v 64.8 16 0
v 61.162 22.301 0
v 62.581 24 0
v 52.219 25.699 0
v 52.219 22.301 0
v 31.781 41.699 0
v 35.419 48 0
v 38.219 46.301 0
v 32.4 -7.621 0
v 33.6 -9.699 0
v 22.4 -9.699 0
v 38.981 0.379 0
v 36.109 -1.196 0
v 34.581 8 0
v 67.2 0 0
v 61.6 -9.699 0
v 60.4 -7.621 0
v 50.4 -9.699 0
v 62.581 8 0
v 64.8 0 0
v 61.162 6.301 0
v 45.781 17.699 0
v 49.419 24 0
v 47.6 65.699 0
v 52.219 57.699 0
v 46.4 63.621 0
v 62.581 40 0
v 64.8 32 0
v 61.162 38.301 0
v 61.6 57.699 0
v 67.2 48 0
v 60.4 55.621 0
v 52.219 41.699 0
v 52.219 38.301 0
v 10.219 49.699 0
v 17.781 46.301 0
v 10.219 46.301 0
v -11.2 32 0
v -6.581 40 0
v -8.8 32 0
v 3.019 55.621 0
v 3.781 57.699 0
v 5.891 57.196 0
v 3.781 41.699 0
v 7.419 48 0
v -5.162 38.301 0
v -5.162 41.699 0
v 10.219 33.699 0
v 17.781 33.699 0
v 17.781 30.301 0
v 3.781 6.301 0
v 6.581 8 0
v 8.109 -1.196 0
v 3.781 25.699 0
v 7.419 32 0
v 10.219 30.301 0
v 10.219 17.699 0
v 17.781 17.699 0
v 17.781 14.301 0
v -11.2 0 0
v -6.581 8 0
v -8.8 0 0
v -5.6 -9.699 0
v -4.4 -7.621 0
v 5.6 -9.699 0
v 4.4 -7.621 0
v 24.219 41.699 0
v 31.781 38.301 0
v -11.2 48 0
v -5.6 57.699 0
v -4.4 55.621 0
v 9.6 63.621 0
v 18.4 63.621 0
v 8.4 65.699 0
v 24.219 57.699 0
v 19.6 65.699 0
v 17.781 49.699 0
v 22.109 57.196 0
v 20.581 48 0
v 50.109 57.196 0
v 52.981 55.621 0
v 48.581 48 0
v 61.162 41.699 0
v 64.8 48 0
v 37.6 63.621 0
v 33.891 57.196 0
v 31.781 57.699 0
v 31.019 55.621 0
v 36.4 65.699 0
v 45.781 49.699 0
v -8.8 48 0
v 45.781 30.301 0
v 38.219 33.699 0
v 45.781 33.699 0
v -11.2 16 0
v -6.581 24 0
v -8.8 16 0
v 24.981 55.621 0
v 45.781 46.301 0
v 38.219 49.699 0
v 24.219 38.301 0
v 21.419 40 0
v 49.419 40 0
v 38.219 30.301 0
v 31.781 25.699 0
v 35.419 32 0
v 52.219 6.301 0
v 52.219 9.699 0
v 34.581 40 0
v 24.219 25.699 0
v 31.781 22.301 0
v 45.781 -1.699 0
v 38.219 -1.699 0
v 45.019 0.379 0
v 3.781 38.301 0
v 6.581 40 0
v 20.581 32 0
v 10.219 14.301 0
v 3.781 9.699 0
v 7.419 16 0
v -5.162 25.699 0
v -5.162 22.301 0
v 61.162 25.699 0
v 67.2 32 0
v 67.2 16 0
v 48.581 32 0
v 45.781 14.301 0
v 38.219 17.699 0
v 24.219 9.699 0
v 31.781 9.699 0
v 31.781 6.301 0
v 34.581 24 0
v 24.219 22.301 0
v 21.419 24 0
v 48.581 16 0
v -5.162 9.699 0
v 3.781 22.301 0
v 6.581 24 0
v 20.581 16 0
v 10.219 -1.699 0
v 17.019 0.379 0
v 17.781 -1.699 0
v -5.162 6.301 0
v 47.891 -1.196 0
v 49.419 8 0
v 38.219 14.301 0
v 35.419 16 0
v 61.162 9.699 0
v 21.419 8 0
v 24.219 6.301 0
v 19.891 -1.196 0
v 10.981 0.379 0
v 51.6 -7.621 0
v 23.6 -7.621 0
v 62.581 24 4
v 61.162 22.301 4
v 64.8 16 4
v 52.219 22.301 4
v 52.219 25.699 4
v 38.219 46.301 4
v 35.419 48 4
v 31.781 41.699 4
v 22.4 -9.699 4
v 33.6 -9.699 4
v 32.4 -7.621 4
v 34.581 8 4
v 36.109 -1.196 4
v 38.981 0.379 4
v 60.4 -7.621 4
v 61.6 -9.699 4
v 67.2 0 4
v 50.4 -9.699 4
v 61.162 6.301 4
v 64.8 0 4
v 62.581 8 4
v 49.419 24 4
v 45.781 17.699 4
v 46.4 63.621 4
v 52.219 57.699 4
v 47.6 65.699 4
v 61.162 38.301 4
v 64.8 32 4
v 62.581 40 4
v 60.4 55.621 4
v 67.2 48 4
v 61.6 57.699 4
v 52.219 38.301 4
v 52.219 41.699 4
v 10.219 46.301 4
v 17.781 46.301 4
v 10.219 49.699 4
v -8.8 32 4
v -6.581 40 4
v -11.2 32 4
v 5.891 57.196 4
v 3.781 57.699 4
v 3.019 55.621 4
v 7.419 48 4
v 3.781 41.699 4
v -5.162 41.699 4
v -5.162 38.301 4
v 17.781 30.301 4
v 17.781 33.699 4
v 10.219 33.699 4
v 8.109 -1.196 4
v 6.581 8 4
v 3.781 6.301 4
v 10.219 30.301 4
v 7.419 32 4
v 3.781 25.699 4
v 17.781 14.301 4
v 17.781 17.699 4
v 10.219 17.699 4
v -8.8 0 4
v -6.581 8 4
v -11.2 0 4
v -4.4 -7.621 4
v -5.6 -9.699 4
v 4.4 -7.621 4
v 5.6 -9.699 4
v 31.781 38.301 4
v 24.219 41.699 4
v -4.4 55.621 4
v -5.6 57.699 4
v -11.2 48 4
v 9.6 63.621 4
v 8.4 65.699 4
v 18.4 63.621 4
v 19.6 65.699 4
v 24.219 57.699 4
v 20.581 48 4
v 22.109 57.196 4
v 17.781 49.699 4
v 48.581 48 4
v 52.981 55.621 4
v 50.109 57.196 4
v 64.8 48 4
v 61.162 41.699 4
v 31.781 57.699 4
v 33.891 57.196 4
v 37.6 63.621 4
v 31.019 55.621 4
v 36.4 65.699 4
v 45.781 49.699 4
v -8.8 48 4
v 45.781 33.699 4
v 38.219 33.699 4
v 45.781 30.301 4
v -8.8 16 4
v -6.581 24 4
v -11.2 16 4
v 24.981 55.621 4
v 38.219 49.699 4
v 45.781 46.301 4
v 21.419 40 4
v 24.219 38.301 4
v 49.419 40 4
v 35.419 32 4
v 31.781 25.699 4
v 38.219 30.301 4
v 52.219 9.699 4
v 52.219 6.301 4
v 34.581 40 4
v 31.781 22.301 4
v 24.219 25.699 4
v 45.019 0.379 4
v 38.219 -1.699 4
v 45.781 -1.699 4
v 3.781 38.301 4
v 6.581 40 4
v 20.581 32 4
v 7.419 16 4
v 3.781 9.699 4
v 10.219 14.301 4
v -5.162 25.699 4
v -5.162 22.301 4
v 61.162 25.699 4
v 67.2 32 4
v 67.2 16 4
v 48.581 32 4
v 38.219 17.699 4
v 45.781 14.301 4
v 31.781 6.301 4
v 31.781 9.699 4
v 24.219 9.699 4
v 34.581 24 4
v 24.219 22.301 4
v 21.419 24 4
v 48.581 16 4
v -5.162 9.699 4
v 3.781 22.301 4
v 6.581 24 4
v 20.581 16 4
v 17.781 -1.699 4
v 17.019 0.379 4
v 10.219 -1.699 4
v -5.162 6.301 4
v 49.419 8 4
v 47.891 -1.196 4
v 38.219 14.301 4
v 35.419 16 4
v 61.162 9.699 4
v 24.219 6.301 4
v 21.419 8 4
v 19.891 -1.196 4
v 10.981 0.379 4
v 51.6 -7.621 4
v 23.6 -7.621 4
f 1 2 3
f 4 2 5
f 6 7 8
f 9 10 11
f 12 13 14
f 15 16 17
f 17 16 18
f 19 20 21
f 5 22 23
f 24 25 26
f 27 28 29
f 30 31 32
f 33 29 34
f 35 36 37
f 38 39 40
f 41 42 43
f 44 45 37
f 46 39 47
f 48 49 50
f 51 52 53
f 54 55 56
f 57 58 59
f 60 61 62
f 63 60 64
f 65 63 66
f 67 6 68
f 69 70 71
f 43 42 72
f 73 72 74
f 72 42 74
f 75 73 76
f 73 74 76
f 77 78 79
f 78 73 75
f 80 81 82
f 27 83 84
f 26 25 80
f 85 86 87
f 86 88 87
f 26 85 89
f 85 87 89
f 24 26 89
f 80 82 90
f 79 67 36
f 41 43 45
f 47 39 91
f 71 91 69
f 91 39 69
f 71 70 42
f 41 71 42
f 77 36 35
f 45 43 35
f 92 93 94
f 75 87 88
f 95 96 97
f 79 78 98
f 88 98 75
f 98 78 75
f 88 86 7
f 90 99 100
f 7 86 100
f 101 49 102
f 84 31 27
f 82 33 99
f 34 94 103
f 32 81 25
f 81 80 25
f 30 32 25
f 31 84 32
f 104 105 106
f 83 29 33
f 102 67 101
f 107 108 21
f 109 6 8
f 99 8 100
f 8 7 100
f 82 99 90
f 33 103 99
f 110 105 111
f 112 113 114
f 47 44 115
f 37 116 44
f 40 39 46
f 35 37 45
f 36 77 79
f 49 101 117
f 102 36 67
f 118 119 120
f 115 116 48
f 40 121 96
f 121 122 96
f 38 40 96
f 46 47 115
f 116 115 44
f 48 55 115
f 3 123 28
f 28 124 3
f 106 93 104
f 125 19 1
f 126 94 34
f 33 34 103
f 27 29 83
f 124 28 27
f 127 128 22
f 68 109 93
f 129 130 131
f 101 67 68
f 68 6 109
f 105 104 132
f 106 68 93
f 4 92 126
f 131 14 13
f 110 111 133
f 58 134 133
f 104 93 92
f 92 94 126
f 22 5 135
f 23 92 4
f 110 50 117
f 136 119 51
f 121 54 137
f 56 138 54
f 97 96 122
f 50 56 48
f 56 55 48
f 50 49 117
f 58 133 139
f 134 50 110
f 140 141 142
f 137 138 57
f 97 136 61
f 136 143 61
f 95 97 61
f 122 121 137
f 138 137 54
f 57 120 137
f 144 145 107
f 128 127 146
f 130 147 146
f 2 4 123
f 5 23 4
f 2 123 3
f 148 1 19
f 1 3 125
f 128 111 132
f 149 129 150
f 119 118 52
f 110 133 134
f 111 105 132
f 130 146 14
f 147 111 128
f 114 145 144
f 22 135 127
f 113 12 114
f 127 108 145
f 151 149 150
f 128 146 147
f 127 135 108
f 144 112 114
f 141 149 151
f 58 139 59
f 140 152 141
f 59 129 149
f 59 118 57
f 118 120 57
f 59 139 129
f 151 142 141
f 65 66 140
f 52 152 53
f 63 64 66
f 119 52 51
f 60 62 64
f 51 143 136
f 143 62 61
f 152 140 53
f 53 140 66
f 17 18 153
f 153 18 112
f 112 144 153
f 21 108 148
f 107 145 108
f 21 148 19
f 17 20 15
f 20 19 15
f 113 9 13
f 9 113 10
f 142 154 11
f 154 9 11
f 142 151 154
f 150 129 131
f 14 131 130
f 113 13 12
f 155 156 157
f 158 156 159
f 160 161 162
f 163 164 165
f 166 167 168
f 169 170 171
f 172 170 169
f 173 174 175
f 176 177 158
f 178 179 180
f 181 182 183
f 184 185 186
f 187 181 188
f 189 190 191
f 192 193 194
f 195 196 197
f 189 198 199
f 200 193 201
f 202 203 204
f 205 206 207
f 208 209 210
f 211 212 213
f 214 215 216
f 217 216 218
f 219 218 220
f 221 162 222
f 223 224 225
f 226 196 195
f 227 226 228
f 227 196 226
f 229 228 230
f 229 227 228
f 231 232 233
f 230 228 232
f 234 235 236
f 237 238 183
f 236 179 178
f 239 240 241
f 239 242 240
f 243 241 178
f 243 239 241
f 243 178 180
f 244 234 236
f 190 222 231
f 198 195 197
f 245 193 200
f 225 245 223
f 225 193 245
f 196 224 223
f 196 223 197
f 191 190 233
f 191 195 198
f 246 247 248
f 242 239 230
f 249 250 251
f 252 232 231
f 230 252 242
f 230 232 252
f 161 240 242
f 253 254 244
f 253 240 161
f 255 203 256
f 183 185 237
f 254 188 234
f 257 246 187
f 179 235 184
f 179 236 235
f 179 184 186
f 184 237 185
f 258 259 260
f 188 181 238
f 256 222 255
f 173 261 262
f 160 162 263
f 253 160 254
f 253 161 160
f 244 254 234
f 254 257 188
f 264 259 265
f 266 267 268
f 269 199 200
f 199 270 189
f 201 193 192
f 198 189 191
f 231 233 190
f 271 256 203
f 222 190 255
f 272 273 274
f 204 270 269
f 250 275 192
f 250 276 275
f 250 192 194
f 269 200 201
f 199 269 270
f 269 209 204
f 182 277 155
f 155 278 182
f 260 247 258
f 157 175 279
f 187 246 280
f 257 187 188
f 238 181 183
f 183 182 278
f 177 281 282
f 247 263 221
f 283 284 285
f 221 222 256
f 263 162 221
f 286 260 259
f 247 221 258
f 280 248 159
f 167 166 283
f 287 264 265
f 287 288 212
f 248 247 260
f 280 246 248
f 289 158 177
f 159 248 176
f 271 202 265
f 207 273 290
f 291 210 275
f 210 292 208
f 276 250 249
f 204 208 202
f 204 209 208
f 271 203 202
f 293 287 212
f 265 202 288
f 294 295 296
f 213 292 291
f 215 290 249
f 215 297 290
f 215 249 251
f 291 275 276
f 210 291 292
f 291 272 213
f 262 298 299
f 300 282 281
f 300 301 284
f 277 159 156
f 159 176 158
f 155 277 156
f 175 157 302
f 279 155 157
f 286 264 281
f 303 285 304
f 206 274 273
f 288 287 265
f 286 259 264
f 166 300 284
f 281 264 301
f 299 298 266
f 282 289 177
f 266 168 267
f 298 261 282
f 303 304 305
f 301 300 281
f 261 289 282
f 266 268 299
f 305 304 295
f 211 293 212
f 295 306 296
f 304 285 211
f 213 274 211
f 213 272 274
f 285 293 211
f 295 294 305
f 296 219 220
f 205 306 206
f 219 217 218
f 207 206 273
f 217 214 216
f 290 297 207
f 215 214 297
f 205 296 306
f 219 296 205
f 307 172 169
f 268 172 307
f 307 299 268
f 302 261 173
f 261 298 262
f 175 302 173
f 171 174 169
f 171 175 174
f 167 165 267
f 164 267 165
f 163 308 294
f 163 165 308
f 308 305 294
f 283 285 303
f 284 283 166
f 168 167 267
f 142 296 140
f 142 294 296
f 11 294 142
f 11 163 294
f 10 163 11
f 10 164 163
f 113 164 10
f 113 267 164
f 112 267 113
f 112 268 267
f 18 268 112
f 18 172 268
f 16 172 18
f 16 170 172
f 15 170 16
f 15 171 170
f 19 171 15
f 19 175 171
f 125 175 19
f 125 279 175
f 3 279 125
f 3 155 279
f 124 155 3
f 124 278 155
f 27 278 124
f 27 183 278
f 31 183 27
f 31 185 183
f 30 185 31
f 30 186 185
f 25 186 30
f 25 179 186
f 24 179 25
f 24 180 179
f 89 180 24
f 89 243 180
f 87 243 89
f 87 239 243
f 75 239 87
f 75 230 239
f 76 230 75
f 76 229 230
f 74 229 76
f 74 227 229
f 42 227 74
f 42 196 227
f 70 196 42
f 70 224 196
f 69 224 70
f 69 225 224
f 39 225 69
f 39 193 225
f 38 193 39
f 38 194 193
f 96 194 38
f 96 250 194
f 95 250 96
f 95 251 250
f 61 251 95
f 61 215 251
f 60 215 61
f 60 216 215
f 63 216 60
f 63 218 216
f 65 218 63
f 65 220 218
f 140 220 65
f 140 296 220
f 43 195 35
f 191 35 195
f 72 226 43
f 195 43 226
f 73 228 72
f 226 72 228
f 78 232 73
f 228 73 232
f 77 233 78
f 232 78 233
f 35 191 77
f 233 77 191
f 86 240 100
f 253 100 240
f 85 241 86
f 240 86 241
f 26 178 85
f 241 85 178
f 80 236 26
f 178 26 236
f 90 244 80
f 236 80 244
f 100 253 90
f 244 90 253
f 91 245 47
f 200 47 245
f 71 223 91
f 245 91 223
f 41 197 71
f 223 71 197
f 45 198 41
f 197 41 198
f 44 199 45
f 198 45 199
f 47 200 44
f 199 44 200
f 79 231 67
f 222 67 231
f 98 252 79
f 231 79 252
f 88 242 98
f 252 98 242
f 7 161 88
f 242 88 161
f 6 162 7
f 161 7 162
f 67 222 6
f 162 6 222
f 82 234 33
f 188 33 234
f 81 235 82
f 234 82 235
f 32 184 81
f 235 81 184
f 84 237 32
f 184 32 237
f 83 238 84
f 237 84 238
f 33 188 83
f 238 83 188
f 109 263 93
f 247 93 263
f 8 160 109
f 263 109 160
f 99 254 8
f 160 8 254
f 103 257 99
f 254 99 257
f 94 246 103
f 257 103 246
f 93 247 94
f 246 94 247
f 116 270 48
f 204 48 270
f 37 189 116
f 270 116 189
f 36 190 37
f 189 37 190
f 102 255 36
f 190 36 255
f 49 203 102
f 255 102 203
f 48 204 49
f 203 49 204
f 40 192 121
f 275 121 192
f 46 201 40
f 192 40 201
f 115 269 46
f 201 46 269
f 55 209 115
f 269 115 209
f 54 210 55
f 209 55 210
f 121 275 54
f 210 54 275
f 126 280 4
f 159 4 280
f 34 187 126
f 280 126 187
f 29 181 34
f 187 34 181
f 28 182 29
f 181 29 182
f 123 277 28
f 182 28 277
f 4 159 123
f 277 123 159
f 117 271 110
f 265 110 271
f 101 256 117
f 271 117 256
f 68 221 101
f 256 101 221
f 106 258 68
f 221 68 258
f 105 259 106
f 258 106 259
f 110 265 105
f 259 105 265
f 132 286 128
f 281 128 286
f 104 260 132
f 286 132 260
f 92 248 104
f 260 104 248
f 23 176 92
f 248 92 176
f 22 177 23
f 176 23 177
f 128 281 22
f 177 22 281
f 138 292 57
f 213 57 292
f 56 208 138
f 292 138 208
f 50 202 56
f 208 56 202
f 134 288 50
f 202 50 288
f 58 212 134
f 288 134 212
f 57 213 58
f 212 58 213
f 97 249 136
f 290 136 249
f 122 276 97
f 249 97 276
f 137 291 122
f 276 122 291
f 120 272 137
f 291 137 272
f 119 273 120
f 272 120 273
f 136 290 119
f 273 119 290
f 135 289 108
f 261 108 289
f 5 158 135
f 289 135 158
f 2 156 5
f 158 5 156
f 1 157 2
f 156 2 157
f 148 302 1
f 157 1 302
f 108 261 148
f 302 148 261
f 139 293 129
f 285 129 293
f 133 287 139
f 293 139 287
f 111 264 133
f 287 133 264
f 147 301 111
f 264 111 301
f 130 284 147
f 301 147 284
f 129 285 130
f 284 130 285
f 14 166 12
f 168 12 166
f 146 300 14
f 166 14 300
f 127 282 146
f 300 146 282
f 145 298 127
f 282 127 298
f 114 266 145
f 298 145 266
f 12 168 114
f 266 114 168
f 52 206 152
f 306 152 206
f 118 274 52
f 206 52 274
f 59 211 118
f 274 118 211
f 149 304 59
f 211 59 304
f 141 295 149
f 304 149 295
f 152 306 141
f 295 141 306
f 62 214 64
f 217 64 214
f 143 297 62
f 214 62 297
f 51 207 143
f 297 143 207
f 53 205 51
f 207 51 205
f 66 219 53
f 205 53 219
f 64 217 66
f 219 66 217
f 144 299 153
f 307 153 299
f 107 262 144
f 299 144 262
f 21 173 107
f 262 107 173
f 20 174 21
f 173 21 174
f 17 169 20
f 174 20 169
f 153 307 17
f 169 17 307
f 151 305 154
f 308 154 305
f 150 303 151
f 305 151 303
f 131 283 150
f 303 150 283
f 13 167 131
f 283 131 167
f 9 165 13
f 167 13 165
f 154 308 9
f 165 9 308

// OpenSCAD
module hexagon(radius)
{
  circle(r=radius,$fn=6);
}
 
module shell(radius)
{
  difference()
  {
    hexagon(radius*1.4); // base//1.2
    hexagon(radius*1.1); // hole
  }
}
 
module piece(radius)
{
  translate([0, 0, -radius/12])
  {
    scale([1,1,0.5])
    {
      hexagon(radius);
    }
  }
}
 
module shell_with_piece(radius)
{
  shell(radius);
  piece(radius);
}
 
function column_to_offset(column, offset) = (column % 2) * offset;
 
module translate_to_hex(x_coord, y_coord, hex_width)
{
  translate([x_coord*hex_width*1.75, y_coord*hex_width*2+column_to_offset(x_coord, hex_width), 0])
  {
    child(0);
  }
}
 
module lattice(rows, columns, hex_width)
{
  for(x = [0:columns-1])
  {
    for(y = [0:rows-1])
    {
      translate_to_hex(x, y, hex_width)
      {
        shell(hex_width);
      }
    }
  }
}
 
linear_extrude(height=4)
{
  lattice(4, 5, 8);
 
  // translate_to_hex(2, 2, 4)
  // {
  //   piece(4);
  // }
}
